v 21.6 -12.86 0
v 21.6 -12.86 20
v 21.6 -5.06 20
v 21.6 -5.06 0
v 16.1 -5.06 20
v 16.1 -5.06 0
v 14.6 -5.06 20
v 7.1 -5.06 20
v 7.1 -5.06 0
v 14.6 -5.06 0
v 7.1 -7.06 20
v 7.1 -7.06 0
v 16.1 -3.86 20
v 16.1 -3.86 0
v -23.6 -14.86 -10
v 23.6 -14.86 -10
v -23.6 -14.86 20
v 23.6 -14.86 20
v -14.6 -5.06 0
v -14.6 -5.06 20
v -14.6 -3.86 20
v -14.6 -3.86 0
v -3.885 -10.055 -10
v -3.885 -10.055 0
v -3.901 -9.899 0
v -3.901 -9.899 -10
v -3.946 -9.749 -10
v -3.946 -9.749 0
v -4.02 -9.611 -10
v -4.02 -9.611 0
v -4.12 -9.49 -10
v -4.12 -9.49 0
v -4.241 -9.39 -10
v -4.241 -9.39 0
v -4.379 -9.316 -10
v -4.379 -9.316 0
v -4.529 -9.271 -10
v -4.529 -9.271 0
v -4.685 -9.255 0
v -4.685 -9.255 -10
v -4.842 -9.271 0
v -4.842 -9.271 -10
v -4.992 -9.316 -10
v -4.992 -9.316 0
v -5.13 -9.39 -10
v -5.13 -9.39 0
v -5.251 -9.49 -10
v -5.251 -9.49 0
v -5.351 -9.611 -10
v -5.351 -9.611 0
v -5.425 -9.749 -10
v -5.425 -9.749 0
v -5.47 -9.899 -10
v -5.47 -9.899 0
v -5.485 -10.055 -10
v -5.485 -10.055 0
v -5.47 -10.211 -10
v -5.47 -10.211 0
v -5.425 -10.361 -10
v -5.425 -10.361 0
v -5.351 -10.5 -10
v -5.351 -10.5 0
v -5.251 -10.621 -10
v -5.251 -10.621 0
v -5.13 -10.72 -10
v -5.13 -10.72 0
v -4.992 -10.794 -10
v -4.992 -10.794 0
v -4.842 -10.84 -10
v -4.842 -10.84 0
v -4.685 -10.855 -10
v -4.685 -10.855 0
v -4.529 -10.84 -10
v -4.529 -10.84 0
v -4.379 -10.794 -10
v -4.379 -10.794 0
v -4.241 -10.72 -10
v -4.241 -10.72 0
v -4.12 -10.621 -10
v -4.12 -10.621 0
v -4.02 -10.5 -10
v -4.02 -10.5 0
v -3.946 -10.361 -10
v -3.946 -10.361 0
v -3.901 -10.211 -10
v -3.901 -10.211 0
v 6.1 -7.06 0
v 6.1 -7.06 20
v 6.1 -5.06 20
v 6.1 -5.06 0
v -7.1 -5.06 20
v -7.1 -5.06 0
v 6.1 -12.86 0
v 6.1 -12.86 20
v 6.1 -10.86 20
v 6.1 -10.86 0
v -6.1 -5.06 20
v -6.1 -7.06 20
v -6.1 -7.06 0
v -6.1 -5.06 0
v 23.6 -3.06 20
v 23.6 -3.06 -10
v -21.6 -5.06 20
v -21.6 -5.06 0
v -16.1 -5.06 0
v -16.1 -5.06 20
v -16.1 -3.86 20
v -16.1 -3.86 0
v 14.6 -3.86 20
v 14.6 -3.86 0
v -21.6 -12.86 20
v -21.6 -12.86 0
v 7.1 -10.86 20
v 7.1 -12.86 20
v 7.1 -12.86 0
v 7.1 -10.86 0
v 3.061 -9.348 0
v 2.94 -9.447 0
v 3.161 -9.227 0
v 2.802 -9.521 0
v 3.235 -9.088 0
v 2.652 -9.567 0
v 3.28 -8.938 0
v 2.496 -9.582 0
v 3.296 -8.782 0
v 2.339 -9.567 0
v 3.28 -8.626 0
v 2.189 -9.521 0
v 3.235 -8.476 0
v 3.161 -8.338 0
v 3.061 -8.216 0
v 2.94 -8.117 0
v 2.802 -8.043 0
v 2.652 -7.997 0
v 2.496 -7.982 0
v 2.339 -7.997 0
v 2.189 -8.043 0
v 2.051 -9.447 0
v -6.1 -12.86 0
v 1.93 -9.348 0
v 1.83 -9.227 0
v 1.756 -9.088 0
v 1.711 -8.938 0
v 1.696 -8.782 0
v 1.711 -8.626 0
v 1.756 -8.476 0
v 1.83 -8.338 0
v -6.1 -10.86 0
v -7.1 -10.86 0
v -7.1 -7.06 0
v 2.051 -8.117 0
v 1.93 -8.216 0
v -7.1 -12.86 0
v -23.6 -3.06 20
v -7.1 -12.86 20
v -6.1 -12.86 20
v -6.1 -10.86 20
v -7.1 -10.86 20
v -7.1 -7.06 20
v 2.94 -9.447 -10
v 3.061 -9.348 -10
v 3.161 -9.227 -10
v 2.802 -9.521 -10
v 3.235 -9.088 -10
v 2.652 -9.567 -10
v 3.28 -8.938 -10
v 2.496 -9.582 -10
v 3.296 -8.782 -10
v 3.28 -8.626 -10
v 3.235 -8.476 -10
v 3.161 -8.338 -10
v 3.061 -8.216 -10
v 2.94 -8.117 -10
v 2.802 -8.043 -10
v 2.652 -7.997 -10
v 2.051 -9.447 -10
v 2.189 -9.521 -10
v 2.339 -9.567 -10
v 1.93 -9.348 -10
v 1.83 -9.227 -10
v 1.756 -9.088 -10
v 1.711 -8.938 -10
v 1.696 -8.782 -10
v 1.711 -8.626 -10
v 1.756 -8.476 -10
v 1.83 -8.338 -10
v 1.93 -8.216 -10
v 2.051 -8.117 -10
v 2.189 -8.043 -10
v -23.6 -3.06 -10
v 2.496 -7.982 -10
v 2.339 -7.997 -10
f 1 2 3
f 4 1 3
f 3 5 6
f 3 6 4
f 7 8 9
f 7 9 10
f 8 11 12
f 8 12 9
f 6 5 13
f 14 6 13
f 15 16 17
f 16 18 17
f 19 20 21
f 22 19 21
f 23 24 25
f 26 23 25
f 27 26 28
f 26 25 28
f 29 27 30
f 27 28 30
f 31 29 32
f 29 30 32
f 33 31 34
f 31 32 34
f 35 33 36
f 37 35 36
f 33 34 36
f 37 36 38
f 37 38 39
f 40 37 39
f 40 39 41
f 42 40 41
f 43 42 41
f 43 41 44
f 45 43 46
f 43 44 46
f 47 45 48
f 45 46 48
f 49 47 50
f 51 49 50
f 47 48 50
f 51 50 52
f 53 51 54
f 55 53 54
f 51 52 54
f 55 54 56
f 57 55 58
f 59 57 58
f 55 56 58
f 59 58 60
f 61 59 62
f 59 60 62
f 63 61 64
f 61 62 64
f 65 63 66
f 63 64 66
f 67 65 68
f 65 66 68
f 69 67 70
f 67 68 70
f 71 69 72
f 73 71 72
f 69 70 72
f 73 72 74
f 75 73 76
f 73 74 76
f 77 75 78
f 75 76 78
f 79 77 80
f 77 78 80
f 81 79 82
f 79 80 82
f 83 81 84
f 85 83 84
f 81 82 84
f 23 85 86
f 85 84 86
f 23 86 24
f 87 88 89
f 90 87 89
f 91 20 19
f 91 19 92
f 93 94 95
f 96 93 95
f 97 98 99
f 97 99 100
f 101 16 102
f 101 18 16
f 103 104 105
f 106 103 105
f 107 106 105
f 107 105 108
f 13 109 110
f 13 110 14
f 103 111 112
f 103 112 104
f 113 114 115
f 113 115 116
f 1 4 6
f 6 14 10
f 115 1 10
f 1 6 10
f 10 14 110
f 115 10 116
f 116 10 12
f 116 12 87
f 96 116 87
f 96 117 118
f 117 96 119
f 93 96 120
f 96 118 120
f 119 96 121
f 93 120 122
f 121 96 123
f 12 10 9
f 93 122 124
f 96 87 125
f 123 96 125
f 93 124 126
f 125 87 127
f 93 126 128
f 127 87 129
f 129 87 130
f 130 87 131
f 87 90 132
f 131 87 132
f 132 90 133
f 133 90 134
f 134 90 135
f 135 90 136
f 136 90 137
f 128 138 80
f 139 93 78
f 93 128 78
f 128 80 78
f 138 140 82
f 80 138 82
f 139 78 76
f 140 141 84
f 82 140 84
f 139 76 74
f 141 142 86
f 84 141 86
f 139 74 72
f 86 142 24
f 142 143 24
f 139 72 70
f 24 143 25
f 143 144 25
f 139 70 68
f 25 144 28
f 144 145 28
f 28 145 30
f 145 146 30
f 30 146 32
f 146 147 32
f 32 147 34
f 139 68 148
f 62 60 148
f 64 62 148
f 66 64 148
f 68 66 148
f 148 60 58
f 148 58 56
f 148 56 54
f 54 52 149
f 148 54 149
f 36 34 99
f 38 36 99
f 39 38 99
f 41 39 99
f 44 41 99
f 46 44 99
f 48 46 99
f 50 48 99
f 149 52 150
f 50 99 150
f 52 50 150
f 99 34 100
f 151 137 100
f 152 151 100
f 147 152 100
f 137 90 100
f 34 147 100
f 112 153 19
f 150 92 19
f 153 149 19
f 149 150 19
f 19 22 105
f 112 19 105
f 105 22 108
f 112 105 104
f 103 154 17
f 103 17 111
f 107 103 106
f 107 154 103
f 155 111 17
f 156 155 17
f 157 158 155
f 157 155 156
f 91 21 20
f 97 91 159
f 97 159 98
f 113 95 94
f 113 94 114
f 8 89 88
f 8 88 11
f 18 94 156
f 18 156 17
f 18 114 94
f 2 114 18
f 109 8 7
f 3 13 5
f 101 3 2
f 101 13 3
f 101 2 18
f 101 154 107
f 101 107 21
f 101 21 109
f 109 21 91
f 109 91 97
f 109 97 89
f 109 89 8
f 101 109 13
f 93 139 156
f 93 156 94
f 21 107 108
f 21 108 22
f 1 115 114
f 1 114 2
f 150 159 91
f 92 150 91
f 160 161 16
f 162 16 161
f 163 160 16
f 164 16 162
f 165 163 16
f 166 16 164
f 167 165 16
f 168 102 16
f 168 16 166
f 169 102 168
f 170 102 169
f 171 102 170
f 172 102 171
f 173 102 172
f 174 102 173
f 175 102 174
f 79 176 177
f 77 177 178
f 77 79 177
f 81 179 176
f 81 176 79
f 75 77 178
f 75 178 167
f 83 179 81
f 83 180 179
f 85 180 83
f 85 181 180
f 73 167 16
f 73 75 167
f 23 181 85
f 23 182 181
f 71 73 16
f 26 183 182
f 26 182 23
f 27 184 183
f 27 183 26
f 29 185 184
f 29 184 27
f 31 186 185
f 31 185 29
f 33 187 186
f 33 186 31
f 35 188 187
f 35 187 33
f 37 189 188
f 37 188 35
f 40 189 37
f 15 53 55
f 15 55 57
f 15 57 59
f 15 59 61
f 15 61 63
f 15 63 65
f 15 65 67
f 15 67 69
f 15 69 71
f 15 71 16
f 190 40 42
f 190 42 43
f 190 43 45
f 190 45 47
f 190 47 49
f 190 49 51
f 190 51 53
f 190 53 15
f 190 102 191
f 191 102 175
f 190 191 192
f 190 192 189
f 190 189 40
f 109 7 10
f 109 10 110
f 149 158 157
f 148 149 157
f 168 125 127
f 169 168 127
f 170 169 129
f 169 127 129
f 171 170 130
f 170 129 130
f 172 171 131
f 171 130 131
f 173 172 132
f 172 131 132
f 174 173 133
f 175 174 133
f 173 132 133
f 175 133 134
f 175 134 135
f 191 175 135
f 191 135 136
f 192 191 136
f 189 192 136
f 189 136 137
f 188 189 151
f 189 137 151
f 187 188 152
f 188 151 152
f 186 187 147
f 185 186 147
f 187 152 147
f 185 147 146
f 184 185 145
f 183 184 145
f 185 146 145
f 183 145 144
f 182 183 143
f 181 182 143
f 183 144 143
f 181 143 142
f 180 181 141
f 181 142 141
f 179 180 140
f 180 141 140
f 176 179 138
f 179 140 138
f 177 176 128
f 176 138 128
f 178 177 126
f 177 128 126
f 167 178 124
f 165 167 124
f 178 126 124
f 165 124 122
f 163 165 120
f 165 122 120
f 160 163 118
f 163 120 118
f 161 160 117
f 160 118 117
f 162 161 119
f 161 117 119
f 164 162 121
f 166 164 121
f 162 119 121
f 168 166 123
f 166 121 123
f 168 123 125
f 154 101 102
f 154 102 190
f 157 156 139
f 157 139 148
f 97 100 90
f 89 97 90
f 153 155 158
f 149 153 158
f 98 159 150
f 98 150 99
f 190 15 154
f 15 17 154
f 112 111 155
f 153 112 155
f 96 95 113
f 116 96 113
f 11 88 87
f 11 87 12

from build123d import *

# Parameters (mm, degrees)
CROQUIS1_W                = 47.2
CROQUIS1_H                = 11.8
CROQUIS1_W_2              = 43.2
CROQUIS1_H_2              = 7.8
SALIENTE_EXTRUIR1_DEPTH   = 20
CROQUIS2_W                = 1.5
CROQUIS2_H                = 1.2
CORTAR_EXTRUIR1_DEPTH     = 20
CROQUIS3_W                = 1
CROQUIS3_H                = 2
SALIENTE_EXTRUIR2_DEPTH   = 20
SALIENTE_EXTRUIR2_2_DEPTH = 20
SALIENTE_EXTRUIR2_3_DEPTH = 20
SALIENTE_EXTRUIR2_4_DEPTH = 20
CROQUIS5_W                = 47.2
CROQUIS5_H                = 11.8
SALIENTE_EXTRUIR3_DEPTH   = 10
CROQUIS6_R                = 0.8
CORTAR_EXTRUIR2_DEPTH     = 10


with BuildPart() as part:
    # Croquis1 → Saliente-Extruir1 (new body)
    with BuildSketch(Plane.XY):
        with Locations((0, -8.96031539)):
            Rectangle(CROQUIS1_W, CROQUIS1_H)
        with Locations((0, -8.96031539)):
            Rectangle(CROQUIS1_W_2, CROQUIS1_H_2, mode=Mode.SUBTRACT)
    extrude(amount=SALIENTE_EXTRUIR1_DEPTH)

    # Croquis2 → Cortar-Extruir1 (cut)
    with BuildSketch(Plane.XY.offset(20)):
        with Locations((-15.35, -4.46031539)):
            Rectangle(CROQUIS2_W, CROQUIS2_H)
        with Locations((15.35, -4.46031539)):
            Rectangle(CROQUIS2_W, CROQUIS2_H)
    extrude(amount=-CORTAR_EXTRUIR1_DEPTH, mode=Mode.SUBTRACT)



with BuildPart() as body_2:
    # Croquis3 → Saliente-Extruir2 (new body)
    with BuildSketch(Plane.XY.offset(20)):
        with Locations((-6.6, -6.06031539)):
            Rectangle(CROQUIS3_W, CROQUIS3_H)
    extrude(amount=-SALIENTE_EXTRUIR2_DEPTH)


with BuildPart() as body_3:
    # Croquis3 → Saliente-Extruir2 2 (new body)
    with BuildSketch(Plane.XY.offset(20)):
        with Locations((6.6, -6.06031539)):
            Rectangle(CROQUIS3_W, CROQUIS3_H)
    extrude(amount=-SALIENTE_EXTRUIR2_2_DEPTH)


with BuildPart() as body_4:
    # Croquis3 → Saliente-Extruir2 3 (new body)
    with BuildSketch(Plane.XY.offset(20)):
        with Locations((-6.6, -11.86031539)):
            Rectangle(CROQUIS3_W, CROQUIS3_H)
    extrude(amount=-SALIENTE_EXTRUIR2_3_DEPTH)


with BuildPart() as body_5:
    # Croquis3 → Saliente-Extruir2 4 (new body)
    with BuildSketch(Plane.XY.offset(20)):
        with Locations((6.6, -11.86031539)):
            Rectangle(CROQUIS3_W, CROQUIS3_H)
    extrude(amount=-SALIENTE_EXTRUIR2_4_DEPTH)


with BuildPart() as part_1:
    add(part.part)

    add(body_2.part)  # Saliente-Extruir3 merges body 2

    add(body_3.part)  # Saliente-Extruir3 merges body 3

    add(body_4.part)  # Saliente-Extruir3 merges body 4

    add(body_5.part)  # Saliente-Extruir3 merges body 5
    # Croquis5 → Saliente-Extruir3 (add)
    with BuildSketch(Plane(origin=(0, 0, 0), x_dir=(-1, 0, 0), z_dir=(0, 0, -1))):
        with Locations((0, -8.96031539)):
            Rectangle(CROQUIS5_W, CROQUIS5_H)
    extrude(amount=SALIENTE_EXTRUIR3_DEPTH)

    # Croquis6 → Cortar-Extruir2 (cut)
    with BuildSketch(Plane.XY):
        with Locations((-4.685466197, -10.055288468)):
            Circle(CROQUIS6_R)
        with Locations((2.49552004, -8.782063958)):
            Circle(CROQUIS6_R)
    extrude(amount=-CORTAR_EXTRUIR2_DEPTH, mode=Mode.SUBTRACT)


solid = part_1.part
